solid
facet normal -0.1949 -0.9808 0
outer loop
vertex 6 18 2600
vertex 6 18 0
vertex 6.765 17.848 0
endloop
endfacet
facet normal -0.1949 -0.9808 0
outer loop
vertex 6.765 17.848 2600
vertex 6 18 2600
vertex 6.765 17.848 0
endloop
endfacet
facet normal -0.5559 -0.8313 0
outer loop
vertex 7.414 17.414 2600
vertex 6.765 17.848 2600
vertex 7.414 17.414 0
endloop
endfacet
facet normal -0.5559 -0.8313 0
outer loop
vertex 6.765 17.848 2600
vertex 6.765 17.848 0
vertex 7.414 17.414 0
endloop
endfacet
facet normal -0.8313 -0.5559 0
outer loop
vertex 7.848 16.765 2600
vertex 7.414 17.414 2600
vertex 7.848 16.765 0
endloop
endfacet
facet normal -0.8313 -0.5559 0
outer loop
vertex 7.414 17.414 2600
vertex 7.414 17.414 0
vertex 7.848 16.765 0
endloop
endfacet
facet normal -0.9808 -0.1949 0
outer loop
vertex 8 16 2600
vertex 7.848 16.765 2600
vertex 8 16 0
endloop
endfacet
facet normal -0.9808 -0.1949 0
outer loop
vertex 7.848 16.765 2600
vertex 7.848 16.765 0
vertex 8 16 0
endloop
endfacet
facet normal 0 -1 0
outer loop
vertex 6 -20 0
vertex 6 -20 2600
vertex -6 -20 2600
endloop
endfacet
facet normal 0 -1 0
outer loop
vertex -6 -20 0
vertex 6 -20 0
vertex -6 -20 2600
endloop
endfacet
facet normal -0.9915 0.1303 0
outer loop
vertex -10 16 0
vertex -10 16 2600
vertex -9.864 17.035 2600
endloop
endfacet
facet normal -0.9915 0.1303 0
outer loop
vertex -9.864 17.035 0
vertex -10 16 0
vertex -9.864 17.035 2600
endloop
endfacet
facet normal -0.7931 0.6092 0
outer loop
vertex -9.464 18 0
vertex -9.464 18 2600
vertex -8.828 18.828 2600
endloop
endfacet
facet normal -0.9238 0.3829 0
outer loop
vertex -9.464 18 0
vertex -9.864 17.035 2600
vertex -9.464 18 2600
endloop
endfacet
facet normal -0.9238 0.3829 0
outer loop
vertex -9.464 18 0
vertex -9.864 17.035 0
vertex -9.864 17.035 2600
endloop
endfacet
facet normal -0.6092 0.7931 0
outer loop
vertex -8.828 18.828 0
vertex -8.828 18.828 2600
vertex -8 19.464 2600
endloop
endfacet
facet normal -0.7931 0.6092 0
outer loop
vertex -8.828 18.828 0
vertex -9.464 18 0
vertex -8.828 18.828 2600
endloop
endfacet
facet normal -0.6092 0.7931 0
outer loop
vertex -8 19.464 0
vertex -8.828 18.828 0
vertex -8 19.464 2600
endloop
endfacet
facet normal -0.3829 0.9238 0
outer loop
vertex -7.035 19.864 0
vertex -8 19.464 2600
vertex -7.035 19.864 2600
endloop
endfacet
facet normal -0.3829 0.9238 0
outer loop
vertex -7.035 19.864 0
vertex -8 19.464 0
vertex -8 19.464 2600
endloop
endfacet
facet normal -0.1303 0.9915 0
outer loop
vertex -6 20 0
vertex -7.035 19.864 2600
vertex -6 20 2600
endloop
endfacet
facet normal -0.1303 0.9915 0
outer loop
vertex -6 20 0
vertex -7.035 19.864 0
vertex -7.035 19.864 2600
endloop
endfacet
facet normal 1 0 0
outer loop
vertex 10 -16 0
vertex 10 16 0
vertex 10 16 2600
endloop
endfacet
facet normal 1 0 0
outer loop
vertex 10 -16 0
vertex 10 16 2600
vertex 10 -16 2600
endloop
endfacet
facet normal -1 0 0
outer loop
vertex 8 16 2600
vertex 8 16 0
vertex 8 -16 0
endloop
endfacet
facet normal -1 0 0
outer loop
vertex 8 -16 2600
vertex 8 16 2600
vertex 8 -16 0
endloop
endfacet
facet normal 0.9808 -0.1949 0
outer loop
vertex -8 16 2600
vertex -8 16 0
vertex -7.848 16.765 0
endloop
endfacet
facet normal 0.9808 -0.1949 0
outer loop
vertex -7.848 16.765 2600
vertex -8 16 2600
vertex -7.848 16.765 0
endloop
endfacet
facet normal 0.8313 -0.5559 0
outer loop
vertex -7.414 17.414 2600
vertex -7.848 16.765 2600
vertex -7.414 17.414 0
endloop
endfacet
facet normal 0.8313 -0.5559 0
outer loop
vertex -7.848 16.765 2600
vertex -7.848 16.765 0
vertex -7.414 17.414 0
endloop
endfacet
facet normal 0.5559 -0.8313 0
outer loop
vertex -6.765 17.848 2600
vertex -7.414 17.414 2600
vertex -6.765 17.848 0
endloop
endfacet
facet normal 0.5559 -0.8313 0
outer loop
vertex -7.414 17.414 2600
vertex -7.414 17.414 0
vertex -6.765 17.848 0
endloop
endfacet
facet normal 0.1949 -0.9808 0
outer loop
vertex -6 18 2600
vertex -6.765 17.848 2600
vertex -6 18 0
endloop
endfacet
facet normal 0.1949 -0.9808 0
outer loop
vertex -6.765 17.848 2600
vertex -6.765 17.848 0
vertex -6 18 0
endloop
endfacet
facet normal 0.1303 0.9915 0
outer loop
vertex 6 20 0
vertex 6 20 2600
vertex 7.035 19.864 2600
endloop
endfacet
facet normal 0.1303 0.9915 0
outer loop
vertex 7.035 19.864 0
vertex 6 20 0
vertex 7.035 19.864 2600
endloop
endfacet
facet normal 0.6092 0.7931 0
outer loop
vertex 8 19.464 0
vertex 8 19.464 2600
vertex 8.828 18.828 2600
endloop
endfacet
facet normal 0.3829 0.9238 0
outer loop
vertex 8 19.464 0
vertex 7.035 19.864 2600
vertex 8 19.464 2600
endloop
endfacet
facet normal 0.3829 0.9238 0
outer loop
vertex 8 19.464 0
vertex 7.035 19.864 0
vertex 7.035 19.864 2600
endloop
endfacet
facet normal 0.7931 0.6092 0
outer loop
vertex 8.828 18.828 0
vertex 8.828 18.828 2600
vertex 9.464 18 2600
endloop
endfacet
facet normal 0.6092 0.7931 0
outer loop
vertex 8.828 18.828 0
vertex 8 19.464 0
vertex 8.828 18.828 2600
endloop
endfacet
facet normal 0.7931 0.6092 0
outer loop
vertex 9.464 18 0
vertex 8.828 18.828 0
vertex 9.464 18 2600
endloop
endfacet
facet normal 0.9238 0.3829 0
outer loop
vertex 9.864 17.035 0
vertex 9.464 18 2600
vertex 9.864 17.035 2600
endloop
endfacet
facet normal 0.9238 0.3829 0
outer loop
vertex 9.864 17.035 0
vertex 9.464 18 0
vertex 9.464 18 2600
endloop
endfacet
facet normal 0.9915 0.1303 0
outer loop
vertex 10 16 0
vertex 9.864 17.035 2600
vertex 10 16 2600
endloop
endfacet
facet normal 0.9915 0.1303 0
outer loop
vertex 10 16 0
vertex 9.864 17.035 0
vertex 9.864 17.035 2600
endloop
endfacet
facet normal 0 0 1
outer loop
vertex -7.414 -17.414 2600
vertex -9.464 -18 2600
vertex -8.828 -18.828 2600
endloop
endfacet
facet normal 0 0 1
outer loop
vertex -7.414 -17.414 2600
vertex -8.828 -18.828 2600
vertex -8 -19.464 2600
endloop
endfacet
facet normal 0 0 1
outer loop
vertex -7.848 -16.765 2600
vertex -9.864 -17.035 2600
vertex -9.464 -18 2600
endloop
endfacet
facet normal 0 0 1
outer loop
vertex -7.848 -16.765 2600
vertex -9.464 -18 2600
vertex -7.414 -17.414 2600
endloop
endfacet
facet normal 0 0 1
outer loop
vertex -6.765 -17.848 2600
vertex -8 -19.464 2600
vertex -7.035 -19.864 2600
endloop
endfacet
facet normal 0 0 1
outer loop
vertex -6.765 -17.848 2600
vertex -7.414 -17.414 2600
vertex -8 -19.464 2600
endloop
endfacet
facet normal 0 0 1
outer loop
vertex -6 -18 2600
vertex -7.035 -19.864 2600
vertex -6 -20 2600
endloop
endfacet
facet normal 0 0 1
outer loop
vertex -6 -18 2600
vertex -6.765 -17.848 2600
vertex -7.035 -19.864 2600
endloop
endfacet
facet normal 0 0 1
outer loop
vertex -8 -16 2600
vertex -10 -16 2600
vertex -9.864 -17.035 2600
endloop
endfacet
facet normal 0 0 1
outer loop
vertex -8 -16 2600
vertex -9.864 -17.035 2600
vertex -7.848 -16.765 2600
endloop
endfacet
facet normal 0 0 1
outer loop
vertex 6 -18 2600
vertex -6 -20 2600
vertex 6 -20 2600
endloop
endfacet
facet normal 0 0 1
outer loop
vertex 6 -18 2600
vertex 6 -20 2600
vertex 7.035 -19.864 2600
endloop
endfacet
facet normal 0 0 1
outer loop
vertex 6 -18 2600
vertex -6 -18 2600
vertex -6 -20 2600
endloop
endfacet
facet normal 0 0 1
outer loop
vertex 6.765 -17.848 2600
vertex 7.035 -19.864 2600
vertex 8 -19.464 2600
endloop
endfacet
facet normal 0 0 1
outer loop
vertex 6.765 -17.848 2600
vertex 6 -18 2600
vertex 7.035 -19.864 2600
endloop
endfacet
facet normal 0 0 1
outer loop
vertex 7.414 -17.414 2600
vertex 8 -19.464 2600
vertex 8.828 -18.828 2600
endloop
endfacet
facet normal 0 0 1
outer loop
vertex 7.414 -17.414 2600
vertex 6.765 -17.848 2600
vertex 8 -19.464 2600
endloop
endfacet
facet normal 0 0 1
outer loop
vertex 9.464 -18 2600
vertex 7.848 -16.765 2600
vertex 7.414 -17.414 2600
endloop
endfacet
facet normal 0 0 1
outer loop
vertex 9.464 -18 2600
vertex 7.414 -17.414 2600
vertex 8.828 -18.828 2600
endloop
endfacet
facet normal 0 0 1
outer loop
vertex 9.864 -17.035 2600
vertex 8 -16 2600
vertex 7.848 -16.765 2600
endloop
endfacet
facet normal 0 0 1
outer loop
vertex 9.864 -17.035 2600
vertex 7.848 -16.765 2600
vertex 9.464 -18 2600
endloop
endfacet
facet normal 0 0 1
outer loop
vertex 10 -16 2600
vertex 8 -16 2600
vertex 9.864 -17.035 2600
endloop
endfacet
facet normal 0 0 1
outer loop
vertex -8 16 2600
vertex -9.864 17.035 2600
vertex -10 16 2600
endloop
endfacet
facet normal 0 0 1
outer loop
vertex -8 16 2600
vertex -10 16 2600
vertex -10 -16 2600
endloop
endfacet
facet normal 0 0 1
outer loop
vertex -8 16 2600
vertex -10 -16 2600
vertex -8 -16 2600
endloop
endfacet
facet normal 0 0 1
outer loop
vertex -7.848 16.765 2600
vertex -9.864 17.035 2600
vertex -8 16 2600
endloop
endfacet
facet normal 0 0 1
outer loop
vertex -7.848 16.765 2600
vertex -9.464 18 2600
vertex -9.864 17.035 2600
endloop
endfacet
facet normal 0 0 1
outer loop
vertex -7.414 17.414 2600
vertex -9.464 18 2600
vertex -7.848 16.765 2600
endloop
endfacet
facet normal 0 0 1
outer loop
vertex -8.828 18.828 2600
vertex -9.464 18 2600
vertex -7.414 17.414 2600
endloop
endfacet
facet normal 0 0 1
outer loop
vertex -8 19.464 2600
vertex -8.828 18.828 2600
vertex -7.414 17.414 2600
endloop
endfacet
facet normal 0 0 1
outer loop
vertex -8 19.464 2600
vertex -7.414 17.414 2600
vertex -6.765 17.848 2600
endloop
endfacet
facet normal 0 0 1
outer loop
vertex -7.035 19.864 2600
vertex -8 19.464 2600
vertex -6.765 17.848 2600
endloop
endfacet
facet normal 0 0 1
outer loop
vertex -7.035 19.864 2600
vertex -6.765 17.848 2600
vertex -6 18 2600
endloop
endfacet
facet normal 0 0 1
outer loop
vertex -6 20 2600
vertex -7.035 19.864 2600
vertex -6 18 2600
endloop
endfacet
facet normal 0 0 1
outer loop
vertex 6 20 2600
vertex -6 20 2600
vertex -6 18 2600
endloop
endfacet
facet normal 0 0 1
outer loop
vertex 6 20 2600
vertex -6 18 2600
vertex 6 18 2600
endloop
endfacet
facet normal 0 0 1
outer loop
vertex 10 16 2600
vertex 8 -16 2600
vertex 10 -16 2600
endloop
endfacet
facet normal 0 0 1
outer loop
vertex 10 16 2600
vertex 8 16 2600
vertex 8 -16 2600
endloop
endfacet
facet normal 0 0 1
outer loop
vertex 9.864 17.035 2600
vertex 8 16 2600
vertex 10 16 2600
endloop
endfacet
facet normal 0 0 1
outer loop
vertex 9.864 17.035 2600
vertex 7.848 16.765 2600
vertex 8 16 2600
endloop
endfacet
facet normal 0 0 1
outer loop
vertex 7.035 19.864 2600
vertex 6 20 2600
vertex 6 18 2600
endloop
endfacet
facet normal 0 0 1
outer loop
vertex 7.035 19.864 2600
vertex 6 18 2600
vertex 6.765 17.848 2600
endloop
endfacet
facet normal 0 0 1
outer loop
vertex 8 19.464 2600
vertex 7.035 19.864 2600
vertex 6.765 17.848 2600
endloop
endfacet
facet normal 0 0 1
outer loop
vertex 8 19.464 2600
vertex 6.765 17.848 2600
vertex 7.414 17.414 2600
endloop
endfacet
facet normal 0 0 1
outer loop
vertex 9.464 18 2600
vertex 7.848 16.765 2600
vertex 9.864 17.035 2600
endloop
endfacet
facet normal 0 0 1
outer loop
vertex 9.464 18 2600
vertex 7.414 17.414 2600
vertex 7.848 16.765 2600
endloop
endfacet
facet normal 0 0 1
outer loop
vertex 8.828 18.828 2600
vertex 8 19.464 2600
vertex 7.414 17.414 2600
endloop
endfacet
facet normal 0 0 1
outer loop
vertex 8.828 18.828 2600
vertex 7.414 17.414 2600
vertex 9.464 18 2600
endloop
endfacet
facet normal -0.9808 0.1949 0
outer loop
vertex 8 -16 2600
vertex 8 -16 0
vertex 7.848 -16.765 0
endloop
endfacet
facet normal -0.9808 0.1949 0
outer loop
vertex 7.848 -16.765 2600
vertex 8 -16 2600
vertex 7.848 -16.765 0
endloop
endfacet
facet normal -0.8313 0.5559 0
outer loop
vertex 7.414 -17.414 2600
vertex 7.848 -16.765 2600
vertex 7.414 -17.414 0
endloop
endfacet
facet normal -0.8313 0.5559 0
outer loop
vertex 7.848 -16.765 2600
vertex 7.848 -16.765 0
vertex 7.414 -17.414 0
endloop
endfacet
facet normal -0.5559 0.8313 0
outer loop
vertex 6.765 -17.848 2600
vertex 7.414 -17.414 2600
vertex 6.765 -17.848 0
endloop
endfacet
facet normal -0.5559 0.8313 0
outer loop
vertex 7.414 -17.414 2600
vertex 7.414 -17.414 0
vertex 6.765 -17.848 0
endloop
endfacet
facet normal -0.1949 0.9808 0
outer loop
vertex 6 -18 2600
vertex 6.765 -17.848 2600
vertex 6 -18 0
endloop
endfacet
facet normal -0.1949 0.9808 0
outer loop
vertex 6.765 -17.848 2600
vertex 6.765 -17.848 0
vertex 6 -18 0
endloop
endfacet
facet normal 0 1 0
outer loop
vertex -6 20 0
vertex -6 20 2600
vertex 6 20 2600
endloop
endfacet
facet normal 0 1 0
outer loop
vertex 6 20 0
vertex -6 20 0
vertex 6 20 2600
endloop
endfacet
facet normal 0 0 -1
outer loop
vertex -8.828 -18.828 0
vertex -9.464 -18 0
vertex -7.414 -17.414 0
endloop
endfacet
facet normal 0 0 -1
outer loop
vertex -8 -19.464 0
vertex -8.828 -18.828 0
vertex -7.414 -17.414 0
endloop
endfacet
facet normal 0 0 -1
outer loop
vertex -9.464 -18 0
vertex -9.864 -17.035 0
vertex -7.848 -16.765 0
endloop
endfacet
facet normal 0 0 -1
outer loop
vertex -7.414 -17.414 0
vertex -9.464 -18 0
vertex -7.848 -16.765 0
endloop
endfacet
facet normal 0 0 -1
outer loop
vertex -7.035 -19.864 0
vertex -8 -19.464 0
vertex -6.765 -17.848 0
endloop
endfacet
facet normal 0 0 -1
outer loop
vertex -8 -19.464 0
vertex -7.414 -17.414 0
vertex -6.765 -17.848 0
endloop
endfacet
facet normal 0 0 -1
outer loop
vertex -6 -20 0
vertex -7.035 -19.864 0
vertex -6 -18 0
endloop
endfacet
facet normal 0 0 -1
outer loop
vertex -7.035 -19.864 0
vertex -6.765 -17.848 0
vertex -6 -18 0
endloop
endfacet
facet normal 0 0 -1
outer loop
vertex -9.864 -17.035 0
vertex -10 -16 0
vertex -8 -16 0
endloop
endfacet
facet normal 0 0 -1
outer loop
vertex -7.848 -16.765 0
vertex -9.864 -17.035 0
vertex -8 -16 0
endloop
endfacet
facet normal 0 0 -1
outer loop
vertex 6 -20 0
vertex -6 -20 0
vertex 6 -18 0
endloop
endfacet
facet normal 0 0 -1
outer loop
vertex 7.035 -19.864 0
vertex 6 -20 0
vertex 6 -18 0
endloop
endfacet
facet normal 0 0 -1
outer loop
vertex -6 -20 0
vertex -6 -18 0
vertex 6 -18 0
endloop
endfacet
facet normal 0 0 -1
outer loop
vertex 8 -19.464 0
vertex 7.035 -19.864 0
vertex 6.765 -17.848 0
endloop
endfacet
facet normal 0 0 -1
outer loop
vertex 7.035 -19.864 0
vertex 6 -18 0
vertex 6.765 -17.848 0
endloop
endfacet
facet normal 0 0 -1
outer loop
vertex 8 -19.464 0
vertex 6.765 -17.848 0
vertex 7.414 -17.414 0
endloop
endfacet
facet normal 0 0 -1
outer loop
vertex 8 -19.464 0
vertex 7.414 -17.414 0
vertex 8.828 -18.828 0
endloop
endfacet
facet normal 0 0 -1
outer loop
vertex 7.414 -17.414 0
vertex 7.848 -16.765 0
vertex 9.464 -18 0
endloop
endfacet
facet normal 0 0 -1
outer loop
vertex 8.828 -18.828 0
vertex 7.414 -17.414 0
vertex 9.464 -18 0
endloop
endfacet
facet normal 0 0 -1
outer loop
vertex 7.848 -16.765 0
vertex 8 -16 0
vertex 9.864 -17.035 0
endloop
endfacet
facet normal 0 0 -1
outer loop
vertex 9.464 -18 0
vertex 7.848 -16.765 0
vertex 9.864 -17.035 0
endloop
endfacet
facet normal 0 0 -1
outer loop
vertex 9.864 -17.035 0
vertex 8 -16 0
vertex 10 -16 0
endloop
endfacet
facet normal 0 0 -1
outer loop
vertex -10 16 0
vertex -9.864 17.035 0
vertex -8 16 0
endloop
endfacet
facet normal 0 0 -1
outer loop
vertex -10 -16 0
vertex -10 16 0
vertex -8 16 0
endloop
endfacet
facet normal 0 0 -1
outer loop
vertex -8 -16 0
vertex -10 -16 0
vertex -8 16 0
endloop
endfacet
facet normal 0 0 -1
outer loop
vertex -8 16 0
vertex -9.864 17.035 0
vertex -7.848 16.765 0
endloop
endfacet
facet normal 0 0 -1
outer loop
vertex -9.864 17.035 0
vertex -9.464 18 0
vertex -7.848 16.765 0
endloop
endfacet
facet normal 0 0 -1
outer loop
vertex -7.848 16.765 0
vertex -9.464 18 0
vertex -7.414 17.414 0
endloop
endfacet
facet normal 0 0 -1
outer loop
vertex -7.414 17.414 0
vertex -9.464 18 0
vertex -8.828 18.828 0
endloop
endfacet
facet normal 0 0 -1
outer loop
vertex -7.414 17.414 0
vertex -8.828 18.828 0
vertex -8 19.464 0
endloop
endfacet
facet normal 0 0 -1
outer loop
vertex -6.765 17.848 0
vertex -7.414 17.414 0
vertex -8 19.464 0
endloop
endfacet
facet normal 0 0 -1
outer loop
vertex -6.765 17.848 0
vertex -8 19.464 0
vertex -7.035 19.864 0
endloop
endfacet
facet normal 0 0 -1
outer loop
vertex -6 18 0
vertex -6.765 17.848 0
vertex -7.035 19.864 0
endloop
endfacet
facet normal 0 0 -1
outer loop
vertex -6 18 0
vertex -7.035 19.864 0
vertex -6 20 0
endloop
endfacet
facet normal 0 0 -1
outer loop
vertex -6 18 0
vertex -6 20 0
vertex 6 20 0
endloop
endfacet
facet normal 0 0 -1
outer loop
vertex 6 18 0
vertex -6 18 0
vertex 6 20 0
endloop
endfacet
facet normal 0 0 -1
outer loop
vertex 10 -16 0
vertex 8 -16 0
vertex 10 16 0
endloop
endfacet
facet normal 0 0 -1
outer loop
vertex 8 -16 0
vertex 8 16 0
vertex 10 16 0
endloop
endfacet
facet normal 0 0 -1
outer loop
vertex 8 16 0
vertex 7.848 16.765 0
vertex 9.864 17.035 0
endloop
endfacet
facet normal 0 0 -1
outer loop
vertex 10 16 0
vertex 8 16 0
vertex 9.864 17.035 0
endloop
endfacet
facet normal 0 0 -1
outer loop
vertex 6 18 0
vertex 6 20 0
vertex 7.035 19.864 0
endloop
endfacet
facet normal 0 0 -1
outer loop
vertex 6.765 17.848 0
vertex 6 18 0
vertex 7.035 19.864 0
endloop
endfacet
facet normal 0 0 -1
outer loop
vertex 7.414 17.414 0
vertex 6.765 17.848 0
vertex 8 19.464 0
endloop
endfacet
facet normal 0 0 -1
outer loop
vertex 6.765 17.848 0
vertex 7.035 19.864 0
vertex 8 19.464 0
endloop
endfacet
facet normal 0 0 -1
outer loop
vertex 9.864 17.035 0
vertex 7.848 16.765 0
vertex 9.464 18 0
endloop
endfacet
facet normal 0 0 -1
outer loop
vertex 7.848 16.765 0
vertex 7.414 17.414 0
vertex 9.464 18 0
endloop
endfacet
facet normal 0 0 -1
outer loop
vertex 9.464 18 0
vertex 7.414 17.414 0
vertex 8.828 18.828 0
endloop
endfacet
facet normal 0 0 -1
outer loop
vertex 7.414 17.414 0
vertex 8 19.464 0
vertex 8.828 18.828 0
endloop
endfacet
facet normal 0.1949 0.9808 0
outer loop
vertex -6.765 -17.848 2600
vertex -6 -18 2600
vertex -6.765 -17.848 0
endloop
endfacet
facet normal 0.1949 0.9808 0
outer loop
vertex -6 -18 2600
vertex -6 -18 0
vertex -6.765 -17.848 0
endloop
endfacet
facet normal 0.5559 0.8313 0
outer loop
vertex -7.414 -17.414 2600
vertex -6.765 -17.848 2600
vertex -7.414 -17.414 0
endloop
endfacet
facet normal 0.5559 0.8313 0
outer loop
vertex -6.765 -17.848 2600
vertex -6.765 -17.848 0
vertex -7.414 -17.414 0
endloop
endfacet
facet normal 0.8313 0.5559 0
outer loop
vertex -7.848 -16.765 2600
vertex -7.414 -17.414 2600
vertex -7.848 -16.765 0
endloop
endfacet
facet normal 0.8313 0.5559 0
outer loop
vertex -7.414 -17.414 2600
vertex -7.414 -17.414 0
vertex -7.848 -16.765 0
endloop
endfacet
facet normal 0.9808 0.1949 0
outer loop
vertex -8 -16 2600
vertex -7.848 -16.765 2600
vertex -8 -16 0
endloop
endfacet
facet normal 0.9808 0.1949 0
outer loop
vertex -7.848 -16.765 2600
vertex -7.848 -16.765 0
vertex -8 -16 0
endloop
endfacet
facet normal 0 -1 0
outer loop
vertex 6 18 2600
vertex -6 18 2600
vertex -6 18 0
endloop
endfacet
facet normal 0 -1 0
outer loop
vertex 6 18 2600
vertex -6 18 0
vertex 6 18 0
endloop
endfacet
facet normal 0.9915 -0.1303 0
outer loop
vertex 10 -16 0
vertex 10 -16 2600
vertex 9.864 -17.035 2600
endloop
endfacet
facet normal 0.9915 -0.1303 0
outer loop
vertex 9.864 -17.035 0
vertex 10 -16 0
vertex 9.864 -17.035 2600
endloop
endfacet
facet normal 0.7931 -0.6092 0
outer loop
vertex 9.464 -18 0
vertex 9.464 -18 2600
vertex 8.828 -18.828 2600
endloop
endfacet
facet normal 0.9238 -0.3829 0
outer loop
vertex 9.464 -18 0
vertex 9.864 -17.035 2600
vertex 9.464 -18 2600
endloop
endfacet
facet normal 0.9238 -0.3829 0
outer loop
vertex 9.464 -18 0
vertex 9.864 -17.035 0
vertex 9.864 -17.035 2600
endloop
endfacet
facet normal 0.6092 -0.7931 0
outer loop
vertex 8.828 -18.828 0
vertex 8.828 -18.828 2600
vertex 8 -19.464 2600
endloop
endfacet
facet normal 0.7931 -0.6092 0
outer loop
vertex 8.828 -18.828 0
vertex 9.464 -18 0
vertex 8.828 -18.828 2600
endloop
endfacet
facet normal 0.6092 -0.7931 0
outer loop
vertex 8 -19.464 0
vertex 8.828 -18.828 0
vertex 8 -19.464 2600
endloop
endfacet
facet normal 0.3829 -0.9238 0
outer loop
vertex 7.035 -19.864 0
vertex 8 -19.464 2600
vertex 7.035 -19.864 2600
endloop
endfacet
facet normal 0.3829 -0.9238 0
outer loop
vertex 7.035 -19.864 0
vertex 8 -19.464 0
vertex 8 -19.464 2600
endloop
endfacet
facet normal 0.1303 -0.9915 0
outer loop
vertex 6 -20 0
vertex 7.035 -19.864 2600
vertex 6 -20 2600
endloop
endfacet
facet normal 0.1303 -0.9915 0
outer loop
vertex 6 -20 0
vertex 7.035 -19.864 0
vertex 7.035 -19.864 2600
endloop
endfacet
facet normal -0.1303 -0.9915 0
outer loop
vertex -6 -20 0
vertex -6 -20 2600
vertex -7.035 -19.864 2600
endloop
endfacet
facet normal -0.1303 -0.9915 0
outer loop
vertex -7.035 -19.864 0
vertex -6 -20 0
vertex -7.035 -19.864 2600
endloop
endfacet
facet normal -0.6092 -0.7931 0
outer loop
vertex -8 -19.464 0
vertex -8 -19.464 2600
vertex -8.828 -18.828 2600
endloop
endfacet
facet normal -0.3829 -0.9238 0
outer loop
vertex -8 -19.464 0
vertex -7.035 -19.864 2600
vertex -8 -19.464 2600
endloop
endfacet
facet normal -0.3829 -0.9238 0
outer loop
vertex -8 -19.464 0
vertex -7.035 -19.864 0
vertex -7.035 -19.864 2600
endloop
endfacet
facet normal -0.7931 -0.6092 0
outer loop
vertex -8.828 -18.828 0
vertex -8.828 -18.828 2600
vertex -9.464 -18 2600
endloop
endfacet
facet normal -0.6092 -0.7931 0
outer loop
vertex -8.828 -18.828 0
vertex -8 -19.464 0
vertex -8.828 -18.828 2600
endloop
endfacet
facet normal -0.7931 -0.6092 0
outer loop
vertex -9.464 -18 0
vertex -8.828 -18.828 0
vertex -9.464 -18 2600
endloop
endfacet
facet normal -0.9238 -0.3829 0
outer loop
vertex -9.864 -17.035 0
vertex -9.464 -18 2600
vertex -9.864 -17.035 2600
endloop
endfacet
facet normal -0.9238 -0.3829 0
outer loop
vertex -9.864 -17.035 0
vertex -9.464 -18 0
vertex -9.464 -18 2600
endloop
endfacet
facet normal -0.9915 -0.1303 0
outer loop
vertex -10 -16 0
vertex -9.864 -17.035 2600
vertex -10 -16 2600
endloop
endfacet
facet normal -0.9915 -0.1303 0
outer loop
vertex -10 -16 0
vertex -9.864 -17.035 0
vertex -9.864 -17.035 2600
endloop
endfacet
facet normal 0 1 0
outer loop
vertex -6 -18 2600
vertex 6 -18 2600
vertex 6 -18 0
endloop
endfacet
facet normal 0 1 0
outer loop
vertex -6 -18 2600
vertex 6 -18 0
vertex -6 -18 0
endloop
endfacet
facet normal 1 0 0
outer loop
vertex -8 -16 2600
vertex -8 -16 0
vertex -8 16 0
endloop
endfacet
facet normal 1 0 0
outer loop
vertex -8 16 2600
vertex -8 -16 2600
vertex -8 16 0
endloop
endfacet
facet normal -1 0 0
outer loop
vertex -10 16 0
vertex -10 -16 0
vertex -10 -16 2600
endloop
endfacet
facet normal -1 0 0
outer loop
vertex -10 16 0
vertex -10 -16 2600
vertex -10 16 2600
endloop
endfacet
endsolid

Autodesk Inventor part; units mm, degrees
ref_plane "YZ Plane" through (0, 0, 0) normal (1, 0, 0) x (0, 1, 0)
ref_plane "Start plane" through (0, 0, 0) normal (0, 0, 1) x (1, 0, 0)
ref_plane "End plane" through (0, 0, 2600) normal (0, 0, 1) x (1, 0, 0)
sketch "Sketch" plane through (0, 0, 0) normal (0, 0, 1) x (1, 0, 0)
  line L0 (-10, -16) -> (-10, 16)
  line L1 (-6, 20) -> (6, 20)
  line L2 (10, 16) -> (10, -16)
  line L3 (6, -20) -> (-6, -20)
  arc A0 (-10, -16) -> (-6, -20) centre (-6, -16) ccw
  arc A1 (10, 16) -> (6, 20) centre (6, 16) ccw
  arc A2 (-6, 20) -> (-10, 16) centre (-6, 16) ccw
  arc A3 (6, -20) -> (10, -16) centre (6, -16) ccw
  arc A4 (-6, 18) -> (-8, 16) centre (-6, 16) ccw
  line L4 (-6, 18) -> (6, 18)
  arc A5 (8, 16) -> (6, 18) centre (6, 16) ccw
  line L5 (8, 16) -> (8, -16)
  arc A6 (6, -18) -> (8, -16) centre (6, -16) ccw
  line L6 (6, -18) -> (-6, -18)
  arc A7 (-8, -16) -> (-6, -18) centre (-6, -16) ccw
  line L7 (-8, -16) -> (-8, 16)
  line L8 (0, 37.1021) -> (0, -37.1021) construction
  line L9 (-23.1021, 0) -> (23.1021, 0) construction
  dimension "d7" = 4
  dimension "d9" = 20
  dimension "d11" = 40
  dimension "d12" = 2
  dimension "d15" = 10
  dimension "d16" = 20
extrude "Body" add sketch "Sketch" along normal up to surface (2600 mm away) from surface at 0
sketch "Sketch3" plane through (0, 0, 0) normal (0, 0, 1) x (1, 0, 0)
  line L0 (0, 0) -> (10, 0)
ref_plane "Work Plane3" through (0, 0, 0) normal (0, -1, 0) x (1, 0, 0)
ref_plane "Work Plane4" through (4294.7542, -381.1194, 3164.8652) normal (0, 1, 0) x (-1, 0, 0)
sketch "Sketch5" plane through (4294.7542, -381.1194, 3164.8652) normal (0, 1, 0) x (-1, 0, 0)
  point P0 (4294.7542, -3164.8652)
sketch "Sketch4" plane through (0, 0, 0) normal (0, -1, 0) x (1, 0, 0)
  line L0 (-2, 0) -> (12, 0) projected
  line L1 (-2, 2600) -> (12, 2600) projected
  dimension "d18" = 2600
equation "\"d7\" = G_IR"
equation "\"d9\" = G_W"
equation "\"d11\" = G_H"
equation "\"d12\" = G_T"
equation "\"d15\" = 0.5 * d9"
equation "\"d16\" = 0.5 * d11"
equation "\"d3\" = G_L"
equation "\"G_W\" = 20"
equation "\"G_H\" = 40"
equation "\"G_T\" = 2"
equation "\"G_IR\" = 4"
equation "\"G_L\" = d18"
equation "\"G_OFFSET_START\" = 0"
equation "\"G_OFFSET_END\" = 0"
properties part number "ISO 10799-2 - 40x20x2 - 2600" material "Steel, Mild"
